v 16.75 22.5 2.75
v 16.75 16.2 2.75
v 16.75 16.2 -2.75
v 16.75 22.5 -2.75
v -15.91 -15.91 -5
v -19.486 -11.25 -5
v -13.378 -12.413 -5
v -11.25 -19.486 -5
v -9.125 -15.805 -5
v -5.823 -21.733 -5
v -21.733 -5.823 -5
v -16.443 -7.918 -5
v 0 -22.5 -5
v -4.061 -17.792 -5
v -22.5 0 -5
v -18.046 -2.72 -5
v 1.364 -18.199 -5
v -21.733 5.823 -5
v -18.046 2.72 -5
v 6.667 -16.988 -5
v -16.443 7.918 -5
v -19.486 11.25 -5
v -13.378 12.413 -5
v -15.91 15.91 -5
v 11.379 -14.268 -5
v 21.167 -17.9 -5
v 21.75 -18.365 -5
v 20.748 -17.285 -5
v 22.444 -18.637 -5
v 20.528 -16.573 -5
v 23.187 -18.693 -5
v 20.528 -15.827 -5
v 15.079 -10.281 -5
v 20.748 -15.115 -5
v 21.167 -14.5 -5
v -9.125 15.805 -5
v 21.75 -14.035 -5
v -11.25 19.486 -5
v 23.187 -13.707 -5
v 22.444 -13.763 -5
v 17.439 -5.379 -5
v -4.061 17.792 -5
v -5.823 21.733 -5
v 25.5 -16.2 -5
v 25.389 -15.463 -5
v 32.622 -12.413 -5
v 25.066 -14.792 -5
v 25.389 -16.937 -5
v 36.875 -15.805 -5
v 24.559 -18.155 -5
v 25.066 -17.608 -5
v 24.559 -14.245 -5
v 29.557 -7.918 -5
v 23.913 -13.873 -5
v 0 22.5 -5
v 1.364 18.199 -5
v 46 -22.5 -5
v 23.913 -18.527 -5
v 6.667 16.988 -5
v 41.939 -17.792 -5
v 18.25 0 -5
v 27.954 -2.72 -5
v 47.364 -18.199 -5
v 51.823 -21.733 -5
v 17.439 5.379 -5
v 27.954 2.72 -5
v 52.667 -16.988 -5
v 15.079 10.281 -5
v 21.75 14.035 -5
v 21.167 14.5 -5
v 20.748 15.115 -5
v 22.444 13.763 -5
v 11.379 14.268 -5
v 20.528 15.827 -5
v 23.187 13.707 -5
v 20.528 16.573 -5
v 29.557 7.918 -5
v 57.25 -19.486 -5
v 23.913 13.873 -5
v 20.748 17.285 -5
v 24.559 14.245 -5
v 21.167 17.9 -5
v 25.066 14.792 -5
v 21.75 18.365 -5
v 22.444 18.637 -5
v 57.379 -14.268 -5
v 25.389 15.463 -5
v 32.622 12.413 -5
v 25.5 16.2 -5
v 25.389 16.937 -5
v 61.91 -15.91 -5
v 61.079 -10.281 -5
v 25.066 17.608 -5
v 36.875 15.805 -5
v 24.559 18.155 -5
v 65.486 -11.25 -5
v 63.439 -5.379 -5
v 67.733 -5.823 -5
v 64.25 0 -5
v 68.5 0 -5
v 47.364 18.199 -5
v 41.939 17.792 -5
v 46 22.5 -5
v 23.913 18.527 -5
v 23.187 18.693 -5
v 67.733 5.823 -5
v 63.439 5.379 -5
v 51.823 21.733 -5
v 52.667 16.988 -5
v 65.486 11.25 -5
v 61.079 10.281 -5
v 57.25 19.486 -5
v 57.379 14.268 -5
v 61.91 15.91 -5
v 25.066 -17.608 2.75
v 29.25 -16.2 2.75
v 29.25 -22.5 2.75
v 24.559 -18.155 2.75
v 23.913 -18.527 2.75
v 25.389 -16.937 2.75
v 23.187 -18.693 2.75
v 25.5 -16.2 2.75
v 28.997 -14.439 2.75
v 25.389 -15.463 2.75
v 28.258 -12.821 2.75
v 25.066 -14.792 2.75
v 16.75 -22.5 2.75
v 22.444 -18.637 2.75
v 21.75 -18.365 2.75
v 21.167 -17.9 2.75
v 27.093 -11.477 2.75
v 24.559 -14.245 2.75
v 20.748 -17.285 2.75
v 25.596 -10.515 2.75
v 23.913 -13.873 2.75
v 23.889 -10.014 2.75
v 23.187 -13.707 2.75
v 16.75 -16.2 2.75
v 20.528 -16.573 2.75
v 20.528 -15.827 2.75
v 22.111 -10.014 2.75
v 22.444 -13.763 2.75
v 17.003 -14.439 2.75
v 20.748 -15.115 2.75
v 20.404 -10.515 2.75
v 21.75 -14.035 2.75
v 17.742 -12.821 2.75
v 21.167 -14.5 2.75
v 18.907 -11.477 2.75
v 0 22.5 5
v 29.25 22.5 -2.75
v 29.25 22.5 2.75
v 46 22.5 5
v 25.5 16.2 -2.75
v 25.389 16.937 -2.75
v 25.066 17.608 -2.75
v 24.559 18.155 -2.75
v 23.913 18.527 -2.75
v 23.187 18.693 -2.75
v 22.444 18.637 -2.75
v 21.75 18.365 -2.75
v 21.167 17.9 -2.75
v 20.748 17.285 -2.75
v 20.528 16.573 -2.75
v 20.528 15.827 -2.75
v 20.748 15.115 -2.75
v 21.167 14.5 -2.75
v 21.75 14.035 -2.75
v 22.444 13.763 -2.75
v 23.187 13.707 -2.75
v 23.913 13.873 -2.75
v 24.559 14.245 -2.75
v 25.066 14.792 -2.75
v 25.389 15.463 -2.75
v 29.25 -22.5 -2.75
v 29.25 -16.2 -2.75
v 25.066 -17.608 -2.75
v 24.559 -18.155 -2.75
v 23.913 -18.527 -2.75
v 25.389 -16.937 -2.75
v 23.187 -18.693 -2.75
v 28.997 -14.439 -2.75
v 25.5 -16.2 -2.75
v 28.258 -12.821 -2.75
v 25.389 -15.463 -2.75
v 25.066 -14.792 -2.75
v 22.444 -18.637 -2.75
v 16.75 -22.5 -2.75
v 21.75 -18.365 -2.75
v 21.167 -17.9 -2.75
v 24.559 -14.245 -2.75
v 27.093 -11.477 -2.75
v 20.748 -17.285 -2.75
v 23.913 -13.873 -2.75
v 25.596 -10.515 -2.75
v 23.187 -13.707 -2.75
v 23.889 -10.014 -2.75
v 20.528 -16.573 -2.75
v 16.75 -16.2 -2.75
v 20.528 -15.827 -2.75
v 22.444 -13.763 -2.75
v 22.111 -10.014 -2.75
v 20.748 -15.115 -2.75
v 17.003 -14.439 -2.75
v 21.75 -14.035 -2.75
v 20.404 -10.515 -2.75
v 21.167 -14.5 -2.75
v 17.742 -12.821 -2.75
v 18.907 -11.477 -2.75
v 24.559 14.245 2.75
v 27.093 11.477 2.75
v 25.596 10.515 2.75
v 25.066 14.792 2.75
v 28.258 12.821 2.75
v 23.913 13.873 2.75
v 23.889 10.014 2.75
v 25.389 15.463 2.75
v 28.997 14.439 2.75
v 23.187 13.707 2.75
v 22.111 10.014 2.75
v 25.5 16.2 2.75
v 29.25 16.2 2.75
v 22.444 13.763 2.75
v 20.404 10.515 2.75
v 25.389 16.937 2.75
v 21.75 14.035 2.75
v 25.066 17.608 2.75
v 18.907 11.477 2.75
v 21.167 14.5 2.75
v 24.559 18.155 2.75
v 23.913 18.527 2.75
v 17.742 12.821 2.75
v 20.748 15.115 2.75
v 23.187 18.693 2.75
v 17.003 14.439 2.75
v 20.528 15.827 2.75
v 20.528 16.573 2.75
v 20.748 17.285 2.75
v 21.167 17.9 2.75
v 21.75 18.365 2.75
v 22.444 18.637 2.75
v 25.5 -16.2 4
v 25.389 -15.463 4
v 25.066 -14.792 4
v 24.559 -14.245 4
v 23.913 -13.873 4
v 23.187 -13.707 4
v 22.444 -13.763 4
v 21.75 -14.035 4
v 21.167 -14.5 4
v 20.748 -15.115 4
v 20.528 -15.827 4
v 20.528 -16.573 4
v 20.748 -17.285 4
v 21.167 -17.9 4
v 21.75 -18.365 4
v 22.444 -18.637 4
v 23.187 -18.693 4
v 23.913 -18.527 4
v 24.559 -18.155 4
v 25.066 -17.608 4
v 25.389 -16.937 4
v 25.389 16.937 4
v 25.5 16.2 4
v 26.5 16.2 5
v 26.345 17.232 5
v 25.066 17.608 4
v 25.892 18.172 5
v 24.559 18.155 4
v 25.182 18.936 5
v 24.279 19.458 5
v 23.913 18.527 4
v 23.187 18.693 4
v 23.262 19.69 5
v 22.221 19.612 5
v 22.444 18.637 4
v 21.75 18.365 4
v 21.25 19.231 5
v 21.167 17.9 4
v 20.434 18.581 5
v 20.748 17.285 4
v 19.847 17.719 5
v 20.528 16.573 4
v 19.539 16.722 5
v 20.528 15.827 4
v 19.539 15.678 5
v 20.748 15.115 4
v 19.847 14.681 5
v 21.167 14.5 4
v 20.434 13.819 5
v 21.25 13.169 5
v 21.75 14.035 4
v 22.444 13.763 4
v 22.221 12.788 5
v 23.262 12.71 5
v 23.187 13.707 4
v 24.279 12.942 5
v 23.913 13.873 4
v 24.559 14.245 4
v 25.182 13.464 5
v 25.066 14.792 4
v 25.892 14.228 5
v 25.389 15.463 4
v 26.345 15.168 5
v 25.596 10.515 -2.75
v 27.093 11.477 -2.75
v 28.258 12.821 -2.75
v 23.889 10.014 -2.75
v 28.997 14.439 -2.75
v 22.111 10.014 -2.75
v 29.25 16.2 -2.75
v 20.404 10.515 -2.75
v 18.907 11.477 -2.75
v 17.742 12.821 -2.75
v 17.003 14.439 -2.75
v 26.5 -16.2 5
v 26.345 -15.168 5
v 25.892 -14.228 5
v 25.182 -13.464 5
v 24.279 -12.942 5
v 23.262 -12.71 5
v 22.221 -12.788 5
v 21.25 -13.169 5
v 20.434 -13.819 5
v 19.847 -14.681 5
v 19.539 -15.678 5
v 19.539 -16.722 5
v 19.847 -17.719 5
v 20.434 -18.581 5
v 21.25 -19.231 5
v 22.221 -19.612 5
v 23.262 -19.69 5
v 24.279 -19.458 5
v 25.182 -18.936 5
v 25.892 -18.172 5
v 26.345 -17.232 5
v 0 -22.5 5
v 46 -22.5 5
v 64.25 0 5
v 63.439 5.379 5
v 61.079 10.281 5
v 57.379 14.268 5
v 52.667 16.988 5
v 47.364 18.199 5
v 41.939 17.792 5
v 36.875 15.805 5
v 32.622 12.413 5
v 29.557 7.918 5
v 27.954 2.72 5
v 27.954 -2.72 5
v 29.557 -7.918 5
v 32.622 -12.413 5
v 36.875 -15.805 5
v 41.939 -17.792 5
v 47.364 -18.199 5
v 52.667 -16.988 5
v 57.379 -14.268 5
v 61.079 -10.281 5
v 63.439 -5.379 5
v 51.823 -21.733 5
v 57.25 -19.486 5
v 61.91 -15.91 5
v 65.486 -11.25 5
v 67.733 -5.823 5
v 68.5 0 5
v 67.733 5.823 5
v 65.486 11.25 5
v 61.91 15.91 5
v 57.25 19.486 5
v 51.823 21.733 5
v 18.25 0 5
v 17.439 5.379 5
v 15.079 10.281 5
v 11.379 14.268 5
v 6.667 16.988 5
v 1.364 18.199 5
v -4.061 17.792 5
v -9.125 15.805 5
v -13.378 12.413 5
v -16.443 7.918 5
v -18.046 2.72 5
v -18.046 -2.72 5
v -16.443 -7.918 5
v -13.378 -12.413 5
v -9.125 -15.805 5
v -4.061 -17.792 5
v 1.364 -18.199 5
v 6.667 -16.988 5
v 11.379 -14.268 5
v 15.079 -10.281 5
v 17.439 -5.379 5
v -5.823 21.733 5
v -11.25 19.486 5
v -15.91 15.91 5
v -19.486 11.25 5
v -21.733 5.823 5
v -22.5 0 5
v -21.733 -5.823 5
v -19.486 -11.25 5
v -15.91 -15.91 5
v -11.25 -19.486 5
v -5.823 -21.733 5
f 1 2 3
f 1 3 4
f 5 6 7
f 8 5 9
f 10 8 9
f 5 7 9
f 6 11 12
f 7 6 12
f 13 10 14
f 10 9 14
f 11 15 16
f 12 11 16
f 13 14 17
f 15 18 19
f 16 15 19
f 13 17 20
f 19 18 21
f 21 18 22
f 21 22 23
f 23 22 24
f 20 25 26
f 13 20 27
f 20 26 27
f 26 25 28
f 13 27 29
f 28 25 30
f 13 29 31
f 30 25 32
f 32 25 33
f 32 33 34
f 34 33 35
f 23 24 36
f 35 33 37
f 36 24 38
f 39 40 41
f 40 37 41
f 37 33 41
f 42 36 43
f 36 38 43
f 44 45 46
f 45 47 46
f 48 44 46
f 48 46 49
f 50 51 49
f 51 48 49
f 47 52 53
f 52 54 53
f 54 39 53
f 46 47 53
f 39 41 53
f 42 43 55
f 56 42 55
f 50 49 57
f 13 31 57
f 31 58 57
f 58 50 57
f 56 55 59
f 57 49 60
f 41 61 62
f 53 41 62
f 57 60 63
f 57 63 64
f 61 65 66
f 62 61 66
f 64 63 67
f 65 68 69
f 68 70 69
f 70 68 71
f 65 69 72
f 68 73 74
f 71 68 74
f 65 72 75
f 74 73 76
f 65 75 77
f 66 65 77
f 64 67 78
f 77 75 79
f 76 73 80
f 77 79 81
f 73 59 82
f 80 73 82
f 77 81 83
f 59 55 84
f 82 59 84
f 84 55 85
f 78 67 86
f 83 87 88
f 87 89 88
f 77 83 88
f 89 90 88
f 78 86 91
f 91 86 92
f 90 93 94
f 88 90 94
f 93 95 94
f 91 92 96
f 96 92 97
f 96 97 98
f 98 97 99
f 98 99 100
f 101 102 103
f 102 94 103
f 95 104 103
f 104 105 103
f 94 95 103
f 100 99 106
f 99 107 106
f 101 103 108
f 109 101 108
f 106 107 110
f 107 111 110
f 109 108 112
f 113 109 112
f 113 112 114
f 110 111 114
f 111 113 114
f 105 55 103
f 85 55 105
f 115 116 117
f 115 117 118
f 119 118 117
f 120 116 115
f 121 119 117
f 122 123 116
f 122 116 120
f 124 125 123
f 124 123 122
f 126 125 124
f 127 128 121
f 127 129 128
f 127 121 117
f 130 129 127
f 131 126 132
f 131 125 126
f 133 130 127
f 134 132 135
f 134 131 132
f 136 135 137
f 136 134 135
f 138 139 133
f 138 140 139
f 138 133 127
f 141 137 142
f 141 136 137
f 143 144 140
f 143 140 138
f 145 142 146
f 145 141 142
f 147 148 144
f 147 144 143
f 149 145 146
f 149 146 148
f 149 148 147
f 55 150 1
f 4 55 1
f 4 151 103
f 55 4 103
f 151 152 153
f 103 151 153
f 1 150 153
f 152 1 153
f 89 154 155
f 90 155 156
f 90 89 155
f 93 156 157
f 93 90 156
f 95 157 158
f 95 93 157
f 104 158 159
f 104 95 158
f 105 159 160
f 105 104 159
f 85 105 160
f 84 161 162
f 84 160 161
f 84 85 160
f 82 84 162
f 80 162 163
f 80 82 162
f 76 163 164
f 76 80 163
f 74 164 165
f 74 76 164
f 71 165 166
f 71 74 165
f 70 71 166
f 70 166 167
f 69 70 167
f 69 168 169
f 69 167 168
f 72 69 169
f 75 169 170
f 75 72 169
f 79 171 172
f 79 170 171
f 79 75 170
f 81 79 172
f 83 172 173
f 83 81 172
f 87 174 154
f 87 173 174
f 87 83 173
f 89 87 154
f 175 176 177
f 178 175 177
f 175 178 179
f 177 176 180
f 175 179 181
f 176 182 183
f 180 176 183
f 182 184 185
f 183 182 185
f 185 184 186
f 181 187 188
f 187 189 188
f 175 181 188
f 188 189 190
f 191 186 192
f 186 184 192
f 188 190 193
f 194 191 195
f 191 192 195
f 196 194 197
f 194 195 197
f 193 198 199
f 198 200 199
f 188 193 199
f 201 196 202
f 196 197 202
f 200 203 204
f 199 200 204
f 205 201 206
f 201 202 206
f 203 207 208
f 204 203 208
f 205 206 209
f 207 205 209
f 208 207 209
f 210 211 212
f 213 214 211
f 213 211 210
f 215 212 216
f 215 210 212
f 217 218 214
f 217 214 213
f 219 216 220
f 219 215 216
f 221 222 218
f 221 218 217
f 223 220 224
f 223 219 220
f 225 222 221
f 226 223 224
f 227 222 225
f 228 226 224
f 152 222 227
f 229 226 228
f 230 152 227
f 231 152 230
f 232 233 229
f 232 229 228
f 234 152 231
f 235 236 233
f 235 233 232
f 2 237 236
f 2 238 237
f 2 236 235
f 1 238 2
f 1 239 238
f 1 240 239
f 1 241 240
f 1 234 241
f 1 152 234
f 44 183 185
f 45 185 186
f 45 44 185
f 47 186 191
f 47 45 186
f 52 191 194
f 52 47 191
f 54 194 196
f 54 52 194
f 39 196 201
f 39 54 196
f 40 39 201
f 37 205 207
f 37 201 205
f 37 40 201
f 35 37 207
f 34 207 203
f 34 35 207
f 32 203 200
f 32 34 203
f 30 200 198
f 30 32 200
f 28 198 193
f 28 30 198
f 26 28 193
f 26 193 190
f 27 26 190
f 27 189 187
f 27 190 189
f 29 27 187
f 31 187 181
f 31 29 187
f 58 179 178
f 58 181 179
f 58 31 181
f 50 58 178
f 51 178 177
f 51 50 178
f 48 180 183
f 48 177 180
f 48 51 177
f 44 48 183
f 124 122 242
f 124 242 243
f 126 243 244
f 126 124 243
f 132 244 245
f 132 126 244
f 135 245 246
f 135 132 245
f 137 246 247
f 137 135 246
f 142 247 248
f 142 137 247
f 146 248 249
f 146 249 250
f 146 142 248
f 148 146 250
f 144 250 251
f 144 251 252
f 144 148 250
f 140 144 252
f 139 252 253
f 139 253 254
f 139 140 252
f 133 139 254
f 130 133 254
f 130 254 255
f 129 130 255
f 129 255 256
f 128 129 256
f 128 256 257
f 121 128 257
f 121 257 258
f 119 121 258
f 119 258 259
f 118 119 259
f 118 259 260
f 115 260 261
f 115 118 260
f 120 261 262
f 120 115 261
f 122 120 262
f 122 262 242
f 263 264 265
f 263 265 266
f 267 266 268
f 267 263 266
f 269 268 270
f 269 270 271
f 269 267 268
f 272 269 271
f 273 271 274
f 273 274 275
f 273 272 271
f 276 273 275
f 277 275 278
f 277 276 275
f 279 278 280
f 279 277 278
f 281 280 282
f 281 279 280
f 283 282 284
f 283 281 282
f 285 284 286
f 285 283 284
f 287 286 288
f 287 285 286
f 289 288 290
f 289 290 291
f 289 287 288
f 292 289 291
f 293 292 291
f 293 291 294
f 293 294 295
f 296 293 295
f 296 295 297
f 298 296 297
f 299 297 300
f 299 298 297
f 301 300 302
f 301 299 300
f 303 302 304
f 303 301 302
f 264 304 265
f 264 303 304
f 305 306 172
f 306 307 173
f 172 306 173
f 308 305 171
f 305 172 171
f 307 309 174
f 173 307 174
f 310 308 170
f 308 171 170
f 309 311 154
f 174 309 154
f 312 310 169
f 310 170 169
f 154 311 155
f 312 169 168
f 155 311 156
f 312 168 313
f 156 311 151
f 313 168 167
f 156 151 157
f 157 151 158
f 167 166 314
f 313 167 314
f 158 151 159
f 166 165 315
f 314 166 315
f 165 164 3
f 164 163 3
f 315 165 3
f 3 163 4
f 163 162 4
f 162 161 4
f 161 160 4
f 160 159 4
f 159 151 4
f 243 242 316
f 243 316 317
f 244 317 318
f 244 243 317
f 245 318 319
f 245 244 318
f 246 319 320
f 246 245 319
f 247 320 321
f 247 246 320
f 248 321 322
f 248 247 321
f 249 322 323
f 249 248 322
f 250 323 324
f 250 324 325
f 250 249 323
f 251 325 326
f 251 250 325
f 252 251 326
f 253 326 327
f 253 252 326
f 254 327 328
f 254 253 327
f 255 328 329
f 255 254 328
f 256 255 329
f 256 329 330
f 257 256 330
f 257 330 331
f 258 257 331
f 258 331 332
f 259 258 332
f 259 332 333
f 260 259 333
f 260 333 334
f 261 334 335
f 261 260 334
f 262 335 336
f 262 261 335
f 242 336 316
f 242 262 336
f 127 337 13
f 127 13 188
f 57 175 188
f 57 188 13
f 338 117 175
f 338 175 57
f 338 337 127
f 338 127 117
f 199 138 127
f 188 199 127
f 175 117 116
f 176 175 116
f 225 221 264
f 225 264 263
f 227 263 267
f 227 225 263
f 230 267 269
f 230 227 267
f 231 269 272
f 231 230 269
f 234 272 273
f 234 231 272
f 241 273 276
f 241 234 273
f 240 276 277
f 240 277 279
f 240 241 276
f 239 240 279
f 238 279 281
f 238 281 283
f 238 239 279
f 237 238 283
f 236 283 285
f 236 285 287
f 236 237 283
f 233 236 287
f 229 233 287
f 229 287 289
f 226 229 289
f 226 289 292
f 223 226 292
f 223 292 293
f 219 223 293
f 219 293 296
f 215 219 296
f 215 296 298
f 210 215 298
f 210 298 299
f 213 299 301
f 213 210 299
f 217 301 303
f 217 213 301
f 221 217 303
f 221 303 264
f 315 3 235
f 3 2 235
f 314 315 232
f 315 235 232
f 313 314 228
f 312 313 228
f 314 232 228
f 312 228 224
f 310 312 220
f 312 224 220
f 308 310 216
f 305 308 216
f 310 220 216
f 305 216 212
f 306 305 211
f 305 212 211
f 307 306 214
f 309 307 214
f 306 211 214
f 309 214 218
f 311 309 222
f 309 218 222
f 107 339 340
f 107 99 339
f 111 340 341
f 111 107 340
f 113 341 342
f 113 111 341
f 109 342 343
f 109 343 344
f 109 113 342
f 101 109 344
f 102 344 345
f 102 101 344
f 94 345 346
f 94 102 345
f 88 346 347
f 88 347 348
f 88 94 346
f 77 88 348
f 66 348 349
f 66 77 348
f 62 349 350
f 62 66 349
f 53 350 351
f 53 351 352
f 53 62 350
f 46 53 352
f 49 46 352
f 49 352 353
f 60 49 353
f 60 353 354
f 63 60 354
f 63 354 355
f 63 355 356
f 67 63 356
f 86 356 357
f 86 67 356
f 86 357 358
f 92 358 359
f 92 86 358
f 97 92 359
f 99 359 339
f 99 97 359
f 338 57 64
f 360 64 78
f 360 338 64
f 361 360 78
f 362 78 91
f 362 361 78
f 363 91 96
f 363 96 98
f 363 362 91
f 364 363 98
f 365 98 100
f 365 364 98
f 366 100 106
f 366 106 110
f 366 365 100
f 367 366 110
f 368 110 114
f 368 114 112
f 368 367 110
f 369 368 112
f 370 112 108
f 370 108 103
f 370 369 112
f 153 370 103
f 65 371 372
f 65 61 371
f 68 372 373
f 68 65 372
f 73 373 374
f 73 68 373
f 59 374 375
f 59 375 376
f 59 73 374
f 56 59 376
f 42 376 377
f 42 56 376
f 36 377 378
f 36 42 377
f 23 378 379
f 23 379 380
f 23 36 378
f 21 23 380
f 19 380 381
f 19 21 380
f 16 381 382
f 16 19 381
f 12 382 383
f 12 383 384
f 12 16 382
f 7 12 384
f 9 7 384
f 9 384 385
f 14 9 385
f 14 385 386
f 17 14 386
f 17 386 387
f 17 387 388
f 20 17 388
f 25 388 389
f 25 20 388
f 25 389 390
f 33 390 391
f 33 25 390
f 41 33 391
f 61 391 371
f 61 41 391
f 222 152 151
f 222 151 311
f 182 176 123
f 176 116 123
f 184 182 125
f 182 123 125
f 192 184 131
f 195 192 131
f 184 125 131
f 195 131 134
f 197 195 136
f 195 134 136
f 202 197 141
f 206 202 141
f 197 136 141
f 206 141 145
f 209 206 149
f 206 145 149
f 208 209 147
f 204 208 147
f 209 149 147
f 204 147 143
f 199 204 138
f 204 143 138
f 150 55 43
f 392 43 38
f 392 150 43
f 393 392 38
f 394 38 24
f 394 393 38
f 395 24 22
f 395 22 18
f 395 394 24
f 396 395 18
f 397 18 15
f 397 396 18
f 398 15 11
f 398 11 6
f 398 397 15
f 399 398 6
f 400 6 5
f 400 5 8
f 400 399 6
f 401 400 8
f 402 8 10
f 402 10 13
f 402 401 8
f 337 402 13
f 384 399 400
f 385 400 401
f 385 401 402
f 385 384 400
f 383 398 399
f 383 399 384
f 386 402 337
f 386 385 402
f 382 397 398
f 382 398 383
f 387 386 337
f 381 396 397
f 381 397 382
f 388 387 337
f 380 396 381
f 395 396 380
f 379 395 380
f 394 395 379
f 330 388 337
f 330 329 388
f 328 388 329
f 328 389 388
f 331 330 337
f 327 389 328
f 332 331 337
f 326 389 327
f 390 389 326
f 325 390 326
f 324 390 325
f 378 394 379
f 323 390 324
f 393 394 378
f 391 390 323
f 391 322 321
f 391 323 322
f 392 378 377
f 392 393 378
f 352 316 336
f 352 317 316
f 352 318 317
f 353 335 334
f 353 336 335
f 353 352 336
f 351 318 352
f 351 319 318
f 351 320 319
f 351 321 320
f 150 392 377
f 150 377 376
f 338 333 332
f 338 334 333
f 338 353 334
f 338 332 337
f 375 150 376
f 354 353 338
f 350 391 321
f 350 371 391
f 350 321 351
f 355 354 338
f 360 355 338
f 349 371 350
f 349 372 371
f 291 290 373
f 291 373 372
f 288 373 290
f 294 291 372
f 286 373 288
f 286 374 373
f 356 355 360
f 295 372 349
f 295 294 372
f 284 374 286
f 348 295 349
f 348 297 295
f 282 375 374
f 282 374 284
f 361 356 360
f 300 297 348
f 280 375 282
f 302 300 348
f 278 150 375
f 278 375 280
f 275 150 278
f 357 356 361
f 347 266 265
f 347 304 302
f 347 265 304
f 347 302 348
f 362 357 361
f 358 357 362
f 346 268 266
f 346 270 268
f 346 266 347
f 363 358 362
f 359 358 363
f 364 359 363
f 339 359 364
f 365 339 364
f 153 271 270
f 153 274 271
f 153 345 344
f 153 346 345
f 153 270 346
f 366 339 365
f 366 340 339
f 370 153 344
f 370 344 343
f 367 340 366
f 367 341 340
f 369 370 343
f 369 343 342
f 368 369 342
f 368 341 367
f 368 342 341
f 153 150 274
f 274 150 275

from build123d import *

# Parameters (mm, degrees)
SKETCH007_R   = 18.25
SKETCH007_R_2 = 2.5
PAD002_DEPTH  = 5
POCKET_DEPTH  = 2.75
CHAMFER_SIZE  = 1


with BuildPart() as part:
    # Sketch007 → Pad002 (new body, symmetric)
    with BuildSketch(Plane.XY):
        with BuildLine():
            ThreePointArc((0, 22.5), (-22.5, 0), (0, -22.5))
            Line((0, -22.5), (46, -22.5))
            ThreePointArc((46, -22.5), (68.5, 0), (46, 22.5))
            Line((0, 22.5), (46, 22.5))
        make_face()
        Circle(SKETCH007_R, mode=Mode.SUBTRACT)
        with Locations((46, 0)):
            Circle(SKETCH007_R, mode=Mode.SUBTRACT)
        with Locations((23, 16.2)):
            Circle(SKETCH007_R_2, mode=Mode.SUBTRACT)
        with Locations((23, -16.2)):
            Circle(SKETCH007_R_2, mode=Mode.SUBTRACT)
    extrude(amount=PAD002_DEPTH, both=True)

    # Sketch069 → Pocket (cut, symmetric)
    with BuildSketch(Plane.XY):
        with BuildLine():
            Line((29.25, 55.400131), (29.25, 16.2))
            ThreePointArc((16.75, 16.2), (23, 9.95), (29.25, 16.2))
            Line((16.75, 16.2), (16.75, 45.38327))
            Line((16.75, 45.38327), (-33.812714, 45.38327))
            Line((-33.812714, 45.38327), (-33.812714, -45.794624))
            Line((-33.812714, -45.794624), (16.75, -45.794624))
            Line((16.75, -16.2), (16.75, -45.794624))
            ThreePointArc((29.25, -16.2), (23, -9.95), (16.75, -16.2))
            Line((29.25, -53.709297), (29.25, -16.2))
            Line((29.25, -53.709297), (-45.873169, -53.709297))
            Line((-45.873169, -53.709297), (-45.873169, 55.400131))
            Line((-45.873169, 55.400131), (29.25, 55.400131))
        make_face()
    extrude(amount=POCKET_DEPTH, both=True, mode=Mode.SUBTRACT)

    # Chamfer
    chamfer_edges = [part.edges().sort_by_distance(p)[0] for p in [
        (20.5, 16.2, 5),
        (20.5, -16.2, 5),
    ]]
    chamfer(chamfer_edges, length=CHAMFER_SIZE)


solid = part.part
